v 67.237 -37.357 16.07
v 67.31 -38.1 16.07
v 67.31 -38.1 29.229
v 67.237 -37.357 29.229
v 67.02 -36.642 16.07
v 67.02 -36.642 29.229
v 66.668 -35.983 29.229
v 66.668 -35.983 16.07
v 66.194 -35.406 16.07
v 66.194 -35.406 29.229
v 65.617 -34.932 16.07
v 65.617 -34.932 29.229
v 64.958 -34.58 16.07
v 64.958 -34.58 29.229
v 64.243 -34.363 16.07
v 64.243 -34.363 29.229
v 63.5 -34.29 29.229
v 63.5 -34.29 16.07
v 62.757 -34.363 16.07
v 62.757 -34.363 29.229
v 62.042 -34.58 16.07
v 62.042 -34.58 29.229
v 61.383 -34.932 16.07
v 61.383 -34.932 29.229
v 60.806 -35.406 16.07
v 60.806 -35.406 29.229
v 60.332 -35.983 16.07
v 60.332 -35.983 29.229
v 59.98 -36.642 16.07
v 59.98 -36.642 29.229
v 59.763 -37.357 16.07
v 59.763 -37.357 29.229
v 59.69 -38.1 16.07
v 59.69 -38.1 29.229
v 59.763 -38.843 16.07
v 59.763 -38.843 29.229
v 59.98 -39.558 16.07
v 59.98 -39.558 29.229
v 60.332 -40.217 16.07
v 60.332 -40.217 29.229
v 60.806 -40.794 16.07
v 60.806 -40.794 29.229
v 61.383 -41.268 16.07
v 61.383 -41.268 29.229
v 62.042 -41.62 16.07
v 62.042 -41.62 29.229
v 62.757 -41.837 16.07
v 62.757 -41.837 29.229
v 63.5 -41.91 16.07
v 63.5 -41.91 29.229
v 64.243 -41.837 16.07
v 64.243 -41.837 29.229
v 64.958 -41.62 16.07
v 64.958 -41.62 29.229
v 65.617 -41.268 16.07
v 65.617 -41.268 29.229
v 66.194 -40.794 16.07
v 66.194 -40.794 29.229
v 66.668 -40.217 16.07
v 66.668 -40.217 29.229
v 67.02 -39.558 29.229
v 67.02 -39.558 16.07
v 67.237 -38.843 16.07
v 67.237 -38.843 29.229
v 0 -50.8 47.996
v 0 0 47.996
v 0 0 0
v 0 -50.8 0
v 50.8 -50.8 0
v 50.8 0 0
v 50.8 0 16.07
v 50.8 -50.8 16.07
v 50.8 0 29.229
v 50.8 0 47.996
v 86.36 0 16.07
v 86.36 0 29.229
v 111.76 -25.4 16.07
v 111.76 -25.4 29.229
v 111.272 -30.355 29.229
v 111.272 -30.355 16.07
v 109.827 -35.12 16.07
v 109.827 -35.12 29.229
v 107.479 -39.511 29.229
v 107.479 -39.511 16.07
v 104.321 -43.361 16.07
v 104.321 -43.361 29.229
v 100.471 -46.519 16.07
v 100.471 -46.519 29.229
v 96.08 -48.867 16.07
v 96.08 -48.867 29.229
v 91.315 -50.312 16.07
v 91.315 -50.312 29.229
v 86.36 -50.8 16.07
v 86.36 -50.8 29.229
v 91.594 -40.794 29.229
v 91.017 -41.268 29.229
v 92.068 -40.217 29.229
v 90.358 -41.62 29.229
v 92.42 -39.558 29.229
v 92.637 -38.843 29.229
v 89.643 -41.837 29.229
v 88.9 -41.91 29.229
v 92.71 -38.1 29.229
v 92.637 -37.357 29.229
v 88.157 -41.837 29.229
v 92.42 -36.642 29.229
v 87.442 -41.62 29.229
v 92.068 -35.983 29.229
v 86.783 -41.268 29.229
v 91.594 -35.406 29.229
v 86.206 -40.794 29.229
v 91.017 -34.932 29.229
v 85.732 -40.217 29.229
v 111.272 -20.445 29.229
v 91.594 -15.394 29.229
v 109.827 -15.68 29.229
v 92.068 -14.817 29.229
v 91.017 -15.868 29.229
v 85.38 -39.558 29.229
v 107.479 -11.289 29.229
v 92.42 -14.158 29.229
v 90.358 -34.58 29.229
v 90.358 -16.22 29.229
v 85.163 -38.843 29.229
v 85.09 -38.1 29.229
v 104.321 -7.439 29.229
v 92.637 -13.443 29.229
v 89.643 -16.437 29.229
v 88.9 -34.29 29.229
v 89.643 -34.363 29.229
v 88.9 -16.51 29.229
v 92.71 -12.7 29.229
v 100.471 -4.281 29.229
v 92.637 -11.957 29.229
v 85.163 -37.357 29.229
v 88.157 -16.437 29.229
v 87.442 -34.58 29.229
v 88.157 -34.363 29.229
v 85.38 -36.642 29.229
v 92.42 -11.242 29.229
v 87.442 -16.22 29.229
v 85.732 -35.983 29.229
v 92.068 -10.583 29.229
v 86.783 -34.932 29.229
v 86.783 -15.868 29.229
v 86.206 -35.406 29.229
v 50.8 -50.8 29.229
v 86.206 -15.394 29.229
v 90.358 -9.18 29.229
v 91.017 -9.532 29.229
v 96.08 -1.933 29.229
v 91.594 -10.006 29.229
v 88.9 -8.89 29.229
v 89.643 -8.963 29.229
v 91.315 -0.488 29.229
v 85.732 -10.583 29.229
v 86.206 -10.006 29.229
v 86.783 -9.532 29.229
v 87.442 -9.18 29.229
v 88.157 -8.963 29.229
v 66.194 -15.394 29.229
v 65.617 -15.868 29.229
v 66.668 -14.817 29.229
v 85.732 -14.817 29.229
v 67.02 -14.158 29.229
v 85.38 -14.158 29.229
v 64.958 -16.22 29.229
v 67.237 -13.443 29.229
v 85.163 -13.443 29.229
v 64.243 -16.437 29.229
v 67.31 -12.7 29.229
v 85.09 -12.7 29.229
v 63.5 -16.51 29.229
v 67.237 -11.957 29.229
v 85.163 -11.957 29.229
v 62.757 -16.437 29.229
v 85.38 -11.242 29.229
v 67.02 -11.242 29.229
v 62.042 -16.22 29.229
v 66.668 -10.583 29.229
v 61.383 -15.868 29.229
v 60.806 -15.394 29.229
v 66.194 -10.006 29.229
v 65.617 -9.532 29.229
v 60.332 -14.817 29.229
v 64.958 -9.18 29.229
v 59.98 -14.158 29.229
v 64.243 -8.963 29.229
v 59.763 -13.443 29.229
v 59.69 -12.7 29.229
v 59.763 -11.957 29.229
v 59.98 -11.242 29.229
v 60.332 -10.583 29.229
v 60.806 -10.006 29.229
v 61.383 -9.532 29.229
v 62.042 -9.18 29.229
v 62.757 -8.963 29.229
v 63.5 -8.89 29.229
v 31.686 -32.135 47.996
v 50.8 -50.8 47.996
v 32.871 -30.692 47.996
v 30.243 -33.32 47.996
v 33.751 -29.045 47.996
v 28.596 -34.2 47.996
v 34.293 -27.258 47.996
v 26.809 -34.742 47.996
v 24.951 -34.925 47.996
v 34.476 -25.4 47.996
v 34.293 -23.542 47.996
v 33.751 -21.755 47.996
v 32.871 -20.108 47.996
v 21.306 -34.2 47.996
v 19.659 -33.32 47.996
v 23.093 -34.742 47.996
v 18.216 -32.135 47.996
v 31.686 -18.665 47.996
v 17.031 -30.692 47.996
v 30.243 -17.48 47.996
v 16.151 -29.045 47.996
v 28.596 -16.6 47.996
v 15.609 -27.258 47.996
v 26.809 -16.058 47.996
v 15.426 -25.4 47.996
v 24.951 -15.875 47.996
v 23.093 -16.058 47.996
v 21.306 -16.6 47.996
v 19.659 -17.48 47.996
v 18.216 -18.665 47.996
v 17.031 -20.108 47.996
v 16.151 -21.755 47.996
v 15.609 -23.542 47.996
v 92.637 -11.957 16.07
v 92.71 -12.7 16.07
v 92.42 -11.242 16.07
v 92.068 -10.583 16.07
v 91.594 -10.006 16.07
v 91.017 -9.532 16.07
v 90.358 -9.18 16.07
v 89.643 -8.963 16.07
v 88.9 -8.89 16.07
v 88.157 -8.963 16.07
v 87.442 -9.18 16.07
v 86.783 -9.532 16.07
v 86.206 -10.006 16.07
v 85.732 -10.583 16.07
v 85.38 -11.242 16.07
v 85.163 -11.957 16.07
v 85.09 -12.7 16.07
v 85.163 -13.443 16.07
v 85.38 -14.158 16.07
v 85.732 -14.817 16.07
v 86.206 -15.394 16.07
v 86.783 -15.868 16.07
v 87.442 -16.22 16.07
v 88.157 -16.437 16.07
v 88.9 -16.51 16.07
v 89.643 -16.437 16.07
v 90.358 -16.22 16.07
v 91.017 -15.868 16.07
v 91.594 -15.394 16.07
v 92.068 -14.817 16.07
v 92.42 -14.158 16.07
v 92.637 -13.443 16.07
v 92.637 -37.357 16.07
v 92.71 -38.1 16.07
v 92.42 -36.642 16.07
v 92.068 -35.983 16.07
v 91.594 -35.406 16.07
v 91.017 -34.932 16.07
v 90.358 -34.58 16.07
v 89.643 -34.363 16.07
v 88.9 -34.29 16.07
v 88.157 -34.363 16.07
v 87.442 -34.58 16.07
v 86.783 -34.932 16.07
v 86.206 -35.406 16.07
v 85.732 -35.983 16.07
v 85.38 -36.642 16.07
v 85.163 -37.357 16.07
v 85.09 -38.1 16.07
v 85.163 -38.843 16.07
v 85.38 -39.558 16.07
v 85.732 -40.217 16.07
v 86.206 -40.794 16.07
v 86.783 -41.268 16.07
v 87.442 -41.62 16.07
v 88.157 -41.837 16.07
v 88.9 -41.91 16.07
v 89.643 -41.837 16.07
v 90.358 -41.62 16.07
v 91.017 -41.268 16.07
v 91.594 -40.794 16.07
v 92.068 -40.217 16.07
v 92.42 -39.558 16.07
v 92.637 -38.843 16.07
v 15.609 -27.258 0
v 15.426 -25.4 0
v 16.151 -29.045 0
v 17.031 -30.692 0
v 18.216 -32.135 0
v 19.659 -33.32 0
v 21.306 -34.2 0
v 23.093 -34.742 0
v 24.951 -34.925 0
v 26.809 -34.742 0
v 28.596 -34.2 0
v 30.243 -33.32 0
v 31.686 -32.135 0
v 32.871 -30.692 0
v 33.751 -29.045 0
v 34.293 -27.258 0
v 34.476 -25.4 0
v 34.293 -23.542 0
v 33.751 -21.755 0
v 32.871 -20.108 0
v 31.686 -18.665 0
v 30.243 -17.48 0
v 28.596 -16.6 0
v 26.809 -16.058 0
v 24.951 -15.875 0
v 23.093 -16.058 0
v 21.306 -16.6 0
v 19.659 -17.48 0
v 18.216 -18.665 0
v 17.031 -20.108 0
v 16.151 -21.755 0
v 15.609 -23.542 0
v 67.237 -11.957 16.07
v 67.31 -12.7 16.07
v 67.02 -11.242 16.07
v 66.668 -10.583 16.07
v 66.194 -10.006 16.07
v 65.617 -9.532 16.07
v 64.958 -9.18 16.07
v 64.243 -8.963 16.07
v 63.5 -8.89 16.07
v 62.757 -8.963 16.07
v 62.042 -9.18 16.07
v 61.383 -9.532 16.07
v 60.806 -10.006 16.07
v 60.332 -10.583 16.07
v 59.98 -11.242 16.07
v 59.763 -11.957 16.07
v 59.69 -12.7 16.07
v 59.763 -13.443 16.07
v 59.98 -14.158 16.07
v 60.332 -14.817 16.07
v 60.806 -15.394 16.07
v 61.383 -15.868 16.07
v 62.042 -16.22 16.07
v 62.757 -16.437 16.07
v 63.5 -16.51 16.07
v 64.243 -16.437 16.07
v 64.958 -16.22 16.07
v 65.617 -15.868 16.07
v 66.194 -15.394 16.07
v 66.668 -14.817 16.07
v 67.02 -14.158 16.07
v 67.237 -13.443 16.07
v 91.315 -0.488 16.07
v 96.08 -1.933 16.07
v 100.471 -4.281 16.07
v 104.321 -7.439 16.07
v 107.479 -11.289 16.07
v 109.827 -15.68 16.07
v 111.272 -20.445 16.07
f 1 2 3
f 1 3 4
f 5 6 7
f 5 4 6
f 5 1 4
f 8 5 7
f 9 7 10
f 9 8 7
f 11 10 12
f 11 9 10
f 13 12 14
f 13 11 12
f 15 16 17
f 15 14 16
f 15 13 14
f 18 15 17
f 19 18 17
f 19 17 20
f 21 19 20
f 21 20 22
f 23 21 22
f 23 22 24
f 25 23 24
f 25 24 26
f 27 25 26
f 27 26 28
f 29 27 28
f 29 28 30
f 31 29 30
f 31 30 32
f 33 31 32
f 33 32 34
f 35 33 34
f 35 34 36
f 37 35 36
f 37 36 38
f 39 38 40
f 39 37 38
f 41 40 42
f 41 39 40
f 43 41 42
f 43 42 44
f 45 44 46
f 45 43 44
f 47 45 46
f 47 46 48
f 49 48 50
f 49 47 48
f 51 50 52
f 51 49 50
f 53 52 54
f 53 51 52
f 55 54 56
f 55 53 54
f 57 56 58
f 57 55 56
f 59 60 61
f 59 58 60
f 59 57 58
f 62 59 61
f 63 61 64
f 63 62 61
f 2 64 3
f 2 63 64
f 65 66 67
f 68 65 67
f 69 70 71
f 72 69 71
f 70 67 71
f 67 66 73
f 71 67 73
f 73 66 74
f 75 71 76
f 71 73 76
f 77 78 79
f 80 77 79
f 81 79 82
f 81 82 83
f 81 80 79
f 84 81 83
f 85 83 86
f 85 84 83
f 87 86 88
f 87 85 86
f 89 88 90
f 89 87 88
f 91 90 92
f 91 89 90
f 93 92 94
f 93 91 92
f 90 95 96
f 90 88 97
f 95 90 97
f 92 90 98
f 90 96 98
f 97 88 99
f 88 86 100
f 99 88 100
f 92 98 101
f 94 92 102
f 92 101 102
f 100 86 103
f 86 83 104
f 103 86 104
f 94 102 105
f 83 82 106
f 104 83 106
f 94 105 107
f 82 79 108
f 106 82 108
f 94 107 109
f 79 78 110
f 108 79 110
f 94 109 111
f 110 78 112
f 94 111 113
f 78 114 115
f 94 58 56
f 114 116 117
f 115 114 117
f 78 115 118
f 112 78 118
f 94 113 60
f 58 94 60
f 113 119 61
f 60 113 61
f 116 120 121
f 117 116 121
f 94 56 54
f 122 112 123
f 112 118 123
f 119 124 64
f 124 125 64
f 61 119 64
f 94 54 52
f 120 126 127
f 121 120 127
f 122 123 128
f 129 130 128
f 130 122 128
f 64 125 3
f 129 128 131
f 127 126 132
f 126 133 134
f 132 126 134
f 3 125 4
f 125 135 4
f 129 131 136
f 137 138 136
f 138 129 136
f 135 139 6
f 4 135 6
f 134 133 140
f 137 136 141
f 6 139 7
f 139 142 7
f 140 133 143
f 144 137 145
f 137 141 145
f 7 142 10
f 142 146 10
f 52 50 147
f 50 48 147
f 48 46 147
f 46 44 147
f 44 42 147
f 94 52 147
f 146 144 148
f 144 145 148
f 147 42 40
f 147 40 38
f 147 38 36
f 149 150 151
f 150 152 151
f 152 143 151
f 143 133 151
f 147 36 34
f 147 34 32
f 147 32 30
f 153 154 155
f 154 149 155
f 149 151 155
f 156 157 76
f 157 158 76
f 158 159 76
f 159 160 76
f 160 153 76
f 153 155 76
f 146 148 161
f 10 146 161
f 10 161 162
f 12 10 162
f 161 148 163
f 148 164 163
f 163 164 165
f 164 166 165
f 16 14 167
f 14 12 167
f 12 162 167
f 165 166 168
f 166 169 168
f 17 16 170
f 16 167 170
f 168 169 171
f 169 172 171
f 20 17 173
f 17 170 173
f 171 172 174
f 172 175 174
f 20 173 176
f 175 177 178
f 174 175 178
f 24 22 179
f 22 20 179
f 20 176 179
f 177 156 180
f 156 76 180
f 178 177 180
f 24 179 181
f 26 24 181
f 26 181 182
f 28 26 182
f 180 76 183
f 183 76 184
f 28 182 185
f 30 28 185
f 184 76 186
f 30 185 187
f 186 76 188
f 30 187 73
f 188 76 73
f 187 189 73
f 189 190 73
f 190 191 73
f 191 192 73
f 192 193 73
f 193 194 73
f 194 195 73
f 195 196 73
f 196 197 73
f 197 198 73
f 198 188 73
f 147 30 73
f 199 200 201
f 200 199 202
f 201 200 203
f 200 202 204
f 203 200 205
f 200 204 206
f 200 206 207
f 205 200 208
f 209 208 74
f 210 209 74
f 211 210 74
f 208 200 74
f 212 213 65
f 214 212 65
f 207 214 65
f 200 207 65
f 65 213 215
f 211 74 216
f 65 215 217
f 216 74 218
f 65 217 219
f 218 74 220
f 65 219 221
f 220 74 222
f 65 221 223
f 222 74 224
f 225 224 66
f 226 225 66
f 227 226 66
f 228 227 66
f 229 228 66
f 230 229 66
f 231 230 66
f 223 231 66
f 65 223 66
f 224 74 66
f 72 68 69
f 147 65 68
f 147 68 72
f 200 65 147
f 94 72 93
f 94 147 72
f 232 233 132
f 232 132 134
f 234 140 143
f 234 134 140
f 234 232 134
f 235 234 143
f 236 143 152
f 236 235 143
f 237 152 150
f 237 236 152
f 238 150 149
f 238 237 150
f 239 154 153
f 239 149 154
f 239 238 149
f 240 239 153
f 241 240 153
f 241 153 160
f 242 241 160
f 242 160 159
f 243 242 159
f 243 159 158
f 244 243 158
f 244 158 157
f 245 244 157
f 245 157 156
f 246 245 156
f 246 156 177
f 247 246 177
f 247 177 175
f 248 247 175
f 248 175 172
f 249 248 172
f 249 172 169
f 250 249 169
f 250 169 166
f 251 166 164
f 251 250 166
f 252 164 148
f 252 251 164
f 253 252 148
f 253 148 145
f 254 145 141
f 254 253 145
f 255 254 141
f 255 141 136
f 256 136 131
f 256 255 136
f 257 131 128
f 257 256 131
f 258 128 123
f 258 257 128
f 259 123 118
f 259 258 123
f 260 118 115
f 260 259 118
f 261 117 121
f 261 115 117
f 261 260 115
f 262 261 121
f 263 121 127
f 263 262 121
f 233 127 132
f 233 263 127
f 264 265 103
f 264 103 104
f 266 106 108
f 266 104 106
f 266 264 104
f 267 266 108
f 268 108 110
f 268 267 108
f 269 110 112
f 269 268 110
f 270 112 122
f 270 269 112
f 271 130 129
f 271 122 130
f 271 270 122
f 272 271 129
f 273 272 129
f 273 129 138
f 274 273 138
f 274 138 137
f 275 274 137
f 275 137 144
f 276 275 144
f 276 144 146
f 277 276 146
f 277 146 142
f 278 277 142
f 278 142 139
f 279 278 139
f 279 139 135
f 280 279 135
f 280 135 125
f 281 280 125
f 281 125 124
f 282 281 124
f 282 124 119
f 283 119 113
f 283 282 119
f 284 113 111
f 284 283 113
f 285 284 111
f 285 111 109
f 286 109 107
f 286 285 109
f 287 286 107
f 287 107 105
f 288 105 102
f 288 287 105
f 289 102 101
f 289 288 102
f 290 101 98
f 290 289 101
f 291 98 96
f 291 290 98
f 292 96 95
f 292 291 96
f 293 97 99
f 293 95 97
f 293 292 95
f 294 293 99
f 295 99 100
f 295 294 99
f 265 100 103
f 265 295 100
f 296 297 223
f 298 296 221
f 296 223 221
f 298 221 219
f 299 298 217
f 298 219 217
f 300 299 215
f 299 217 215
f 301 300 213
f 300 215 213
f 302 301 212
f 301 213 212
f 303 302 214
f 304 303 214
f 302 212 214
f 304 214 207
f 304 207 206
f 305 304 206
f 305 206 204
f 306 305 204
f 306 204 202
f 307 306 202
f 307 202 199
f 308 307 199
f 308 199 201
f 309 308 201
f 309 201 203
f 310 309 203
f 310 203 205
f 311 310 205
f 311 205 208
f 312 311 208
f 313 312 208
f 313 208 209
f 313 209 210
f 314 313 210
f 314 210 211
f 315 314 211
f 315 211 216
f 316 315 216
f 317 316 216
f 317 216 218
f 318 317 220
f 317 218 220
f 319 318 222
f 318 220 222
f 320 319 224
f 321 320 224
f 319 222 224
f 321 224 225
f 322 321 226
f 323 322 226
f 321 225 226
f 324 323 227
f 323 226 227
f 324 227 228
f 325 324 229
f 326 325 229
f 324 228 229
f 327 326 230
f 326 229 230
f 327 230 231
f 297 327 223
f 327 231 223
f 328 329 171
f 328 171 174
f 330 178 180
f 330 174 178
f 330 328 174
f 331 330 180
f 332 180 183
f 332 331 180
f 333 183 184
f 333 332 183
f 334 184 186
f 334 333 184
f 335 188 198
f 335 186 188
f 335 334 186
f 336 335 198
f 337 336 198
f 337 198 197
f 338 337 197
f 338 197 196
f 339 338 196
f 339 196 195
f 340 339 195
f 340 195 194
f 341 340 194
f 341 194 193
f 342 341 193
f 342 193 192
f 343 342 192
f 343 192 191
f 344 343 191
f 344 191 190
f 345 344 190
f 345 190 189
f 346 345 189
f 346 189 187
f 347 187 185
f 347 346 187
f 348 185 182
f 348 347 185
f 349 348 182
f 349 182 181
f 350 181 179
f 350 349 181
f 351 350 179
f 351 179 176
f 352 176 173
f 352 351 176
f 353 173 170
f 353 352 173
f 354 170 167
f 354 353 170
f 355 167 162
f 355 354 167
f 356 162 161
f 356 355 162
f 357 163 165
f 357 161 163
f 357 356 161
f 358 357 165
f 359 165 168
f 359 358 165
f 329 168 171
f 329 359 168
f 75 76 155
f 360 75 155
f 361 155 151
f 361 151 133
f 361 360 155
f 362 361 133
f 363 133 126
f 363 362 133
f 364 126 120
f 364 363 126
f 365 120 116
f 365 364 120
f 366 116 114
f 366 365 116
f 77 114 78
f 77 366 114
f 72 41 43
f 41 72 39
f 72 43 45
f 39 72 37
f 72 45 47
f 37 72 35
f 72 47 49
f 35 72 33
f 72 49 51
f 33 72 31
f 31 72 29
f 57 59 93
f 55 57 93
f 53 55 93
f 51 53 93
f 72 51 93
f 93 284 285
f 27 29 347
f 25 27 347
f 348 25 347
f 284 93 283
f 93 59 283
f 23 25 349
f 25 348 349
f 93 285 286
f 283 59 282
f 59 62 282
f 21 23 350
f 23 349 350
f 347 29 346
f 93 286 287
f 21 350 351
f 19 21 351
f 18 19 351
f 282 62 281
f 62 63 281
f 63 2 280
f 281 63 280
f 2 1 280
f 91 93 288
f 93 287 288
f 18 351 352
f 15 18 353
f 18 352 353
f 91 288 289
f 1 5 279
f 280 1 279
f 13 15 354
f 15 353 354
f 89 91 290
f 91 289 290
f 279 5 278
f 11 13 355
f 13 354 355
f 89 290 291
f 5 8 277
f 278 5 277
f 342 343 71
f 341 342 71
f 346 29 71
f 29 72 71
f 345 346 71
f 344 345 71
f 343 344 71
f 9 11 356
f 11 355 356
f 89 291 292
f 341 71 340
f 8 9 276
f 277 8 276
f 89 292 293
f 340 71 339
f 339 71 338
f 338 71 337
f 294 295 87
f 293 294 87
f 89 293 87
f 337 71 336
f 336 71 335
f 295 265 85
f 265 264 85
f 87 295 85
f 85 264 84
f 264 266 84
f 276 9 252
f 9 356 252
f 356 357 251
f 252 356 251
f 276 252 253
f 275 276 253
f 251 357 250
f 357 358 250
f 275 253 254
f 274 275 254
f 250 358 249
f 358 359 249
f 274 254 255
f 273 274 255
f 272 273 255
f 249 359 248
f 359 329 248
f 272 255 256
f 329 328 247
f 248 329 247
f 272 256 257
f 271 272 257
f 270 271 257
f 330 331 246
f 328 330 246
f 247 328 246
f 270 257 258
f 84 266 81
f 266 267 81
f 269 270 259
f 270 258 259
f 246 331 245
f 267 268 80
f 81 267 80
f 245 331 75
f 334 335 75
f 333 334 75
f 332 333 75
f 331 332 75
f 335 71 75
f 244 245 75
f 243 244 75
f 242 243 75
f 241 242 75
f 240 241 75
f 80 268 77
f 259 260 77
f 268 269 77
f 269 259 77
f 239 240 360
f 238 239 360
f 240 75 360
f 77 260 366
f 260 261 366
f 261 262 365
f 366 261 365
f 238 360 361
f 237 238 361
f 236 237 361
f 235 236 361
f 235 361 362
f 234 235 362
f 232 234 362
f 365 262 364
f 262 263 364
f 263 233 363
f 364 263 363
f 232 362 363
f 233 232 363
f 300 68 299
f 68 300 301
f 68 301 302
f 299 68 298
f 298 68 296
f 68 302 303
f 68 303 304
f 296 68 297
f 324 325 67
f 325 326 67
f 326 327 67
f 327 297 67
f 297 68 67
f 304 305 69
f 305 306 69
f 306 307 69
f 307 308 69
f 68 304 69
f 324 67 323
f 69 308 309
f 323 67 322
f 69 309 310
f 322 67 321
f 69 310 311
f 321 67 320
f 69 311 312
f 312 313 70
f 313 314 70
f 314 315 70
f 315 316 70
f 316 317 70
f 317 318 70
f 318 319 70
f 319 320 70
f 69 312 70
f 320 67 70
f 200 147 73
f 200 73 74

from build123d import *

# Parameters (mm, degrees)
F1_DEPTH = 50.8
F3_D     = 19.05
F2_R     = 3.81
F4_DEPTH = 47.9967516642


with BuildPart() as f1:
    # F0 (on Front) → F1 (new body)
    with BuildSketch(Plane.XZ):
        Polygon((0, 47.9957516642), (0, 0), (50.8, 0), (50.8, 16.0704886385), (111.76, 16.0704886385), (111.76, 29.228876307), (50.8, 29.228876307), (50.8, 47.9957516642), align=None)
    extrude(amount=F1_DEPTH)

    # F3 (through all)
    with Locations(Plane(origin=(0, 0, 0), x_dir=(1, 0, 0), z_dir=(0, 0, -1))):
        with Locations((24.9511450529, 25.4)):
            Hole(F3_D / 2)

    # F2 (on Top) → F4 (cut, through all)
    with BuildSketch(Plane.XY):
        with Locations((63.5, -12.7)):
            Circle(F2_R)
        with Locations((63.5, -38.1)):
            Circle(F2_R)
        with Locations((88.9, -12.7)):
            Circle(F2_R)
        with Locations((88.9, -38.1)):
            Circle(F2_R)
        with BuildLine():
            Line((111.76, -50.8), (111.76, -25.4))
            ThreePointArc((111.76, -25.4), (104.3205122421, -43.3605122421), (86.36, -50.8))
            Line((86.36, -50.8), (88.9, -50.8))
            Line((88.9, -50.8), (111.76, -50.8))
        make_face()
        with BuildLine():
            Line((88.9, 0), (86.36, 0))
            ThreePointArc((86.36, 0), (104.3205122421, -7.4394877579), (111.76, -25.4))
            Line((111.76, -25.4), (111.76, 0))
            Line((111.76, 0), (88.9, 0))
        make_face()
    extrude(amount=F4_DEPTH, mode=Mode.SUBTRACT)


solid = f1.part
